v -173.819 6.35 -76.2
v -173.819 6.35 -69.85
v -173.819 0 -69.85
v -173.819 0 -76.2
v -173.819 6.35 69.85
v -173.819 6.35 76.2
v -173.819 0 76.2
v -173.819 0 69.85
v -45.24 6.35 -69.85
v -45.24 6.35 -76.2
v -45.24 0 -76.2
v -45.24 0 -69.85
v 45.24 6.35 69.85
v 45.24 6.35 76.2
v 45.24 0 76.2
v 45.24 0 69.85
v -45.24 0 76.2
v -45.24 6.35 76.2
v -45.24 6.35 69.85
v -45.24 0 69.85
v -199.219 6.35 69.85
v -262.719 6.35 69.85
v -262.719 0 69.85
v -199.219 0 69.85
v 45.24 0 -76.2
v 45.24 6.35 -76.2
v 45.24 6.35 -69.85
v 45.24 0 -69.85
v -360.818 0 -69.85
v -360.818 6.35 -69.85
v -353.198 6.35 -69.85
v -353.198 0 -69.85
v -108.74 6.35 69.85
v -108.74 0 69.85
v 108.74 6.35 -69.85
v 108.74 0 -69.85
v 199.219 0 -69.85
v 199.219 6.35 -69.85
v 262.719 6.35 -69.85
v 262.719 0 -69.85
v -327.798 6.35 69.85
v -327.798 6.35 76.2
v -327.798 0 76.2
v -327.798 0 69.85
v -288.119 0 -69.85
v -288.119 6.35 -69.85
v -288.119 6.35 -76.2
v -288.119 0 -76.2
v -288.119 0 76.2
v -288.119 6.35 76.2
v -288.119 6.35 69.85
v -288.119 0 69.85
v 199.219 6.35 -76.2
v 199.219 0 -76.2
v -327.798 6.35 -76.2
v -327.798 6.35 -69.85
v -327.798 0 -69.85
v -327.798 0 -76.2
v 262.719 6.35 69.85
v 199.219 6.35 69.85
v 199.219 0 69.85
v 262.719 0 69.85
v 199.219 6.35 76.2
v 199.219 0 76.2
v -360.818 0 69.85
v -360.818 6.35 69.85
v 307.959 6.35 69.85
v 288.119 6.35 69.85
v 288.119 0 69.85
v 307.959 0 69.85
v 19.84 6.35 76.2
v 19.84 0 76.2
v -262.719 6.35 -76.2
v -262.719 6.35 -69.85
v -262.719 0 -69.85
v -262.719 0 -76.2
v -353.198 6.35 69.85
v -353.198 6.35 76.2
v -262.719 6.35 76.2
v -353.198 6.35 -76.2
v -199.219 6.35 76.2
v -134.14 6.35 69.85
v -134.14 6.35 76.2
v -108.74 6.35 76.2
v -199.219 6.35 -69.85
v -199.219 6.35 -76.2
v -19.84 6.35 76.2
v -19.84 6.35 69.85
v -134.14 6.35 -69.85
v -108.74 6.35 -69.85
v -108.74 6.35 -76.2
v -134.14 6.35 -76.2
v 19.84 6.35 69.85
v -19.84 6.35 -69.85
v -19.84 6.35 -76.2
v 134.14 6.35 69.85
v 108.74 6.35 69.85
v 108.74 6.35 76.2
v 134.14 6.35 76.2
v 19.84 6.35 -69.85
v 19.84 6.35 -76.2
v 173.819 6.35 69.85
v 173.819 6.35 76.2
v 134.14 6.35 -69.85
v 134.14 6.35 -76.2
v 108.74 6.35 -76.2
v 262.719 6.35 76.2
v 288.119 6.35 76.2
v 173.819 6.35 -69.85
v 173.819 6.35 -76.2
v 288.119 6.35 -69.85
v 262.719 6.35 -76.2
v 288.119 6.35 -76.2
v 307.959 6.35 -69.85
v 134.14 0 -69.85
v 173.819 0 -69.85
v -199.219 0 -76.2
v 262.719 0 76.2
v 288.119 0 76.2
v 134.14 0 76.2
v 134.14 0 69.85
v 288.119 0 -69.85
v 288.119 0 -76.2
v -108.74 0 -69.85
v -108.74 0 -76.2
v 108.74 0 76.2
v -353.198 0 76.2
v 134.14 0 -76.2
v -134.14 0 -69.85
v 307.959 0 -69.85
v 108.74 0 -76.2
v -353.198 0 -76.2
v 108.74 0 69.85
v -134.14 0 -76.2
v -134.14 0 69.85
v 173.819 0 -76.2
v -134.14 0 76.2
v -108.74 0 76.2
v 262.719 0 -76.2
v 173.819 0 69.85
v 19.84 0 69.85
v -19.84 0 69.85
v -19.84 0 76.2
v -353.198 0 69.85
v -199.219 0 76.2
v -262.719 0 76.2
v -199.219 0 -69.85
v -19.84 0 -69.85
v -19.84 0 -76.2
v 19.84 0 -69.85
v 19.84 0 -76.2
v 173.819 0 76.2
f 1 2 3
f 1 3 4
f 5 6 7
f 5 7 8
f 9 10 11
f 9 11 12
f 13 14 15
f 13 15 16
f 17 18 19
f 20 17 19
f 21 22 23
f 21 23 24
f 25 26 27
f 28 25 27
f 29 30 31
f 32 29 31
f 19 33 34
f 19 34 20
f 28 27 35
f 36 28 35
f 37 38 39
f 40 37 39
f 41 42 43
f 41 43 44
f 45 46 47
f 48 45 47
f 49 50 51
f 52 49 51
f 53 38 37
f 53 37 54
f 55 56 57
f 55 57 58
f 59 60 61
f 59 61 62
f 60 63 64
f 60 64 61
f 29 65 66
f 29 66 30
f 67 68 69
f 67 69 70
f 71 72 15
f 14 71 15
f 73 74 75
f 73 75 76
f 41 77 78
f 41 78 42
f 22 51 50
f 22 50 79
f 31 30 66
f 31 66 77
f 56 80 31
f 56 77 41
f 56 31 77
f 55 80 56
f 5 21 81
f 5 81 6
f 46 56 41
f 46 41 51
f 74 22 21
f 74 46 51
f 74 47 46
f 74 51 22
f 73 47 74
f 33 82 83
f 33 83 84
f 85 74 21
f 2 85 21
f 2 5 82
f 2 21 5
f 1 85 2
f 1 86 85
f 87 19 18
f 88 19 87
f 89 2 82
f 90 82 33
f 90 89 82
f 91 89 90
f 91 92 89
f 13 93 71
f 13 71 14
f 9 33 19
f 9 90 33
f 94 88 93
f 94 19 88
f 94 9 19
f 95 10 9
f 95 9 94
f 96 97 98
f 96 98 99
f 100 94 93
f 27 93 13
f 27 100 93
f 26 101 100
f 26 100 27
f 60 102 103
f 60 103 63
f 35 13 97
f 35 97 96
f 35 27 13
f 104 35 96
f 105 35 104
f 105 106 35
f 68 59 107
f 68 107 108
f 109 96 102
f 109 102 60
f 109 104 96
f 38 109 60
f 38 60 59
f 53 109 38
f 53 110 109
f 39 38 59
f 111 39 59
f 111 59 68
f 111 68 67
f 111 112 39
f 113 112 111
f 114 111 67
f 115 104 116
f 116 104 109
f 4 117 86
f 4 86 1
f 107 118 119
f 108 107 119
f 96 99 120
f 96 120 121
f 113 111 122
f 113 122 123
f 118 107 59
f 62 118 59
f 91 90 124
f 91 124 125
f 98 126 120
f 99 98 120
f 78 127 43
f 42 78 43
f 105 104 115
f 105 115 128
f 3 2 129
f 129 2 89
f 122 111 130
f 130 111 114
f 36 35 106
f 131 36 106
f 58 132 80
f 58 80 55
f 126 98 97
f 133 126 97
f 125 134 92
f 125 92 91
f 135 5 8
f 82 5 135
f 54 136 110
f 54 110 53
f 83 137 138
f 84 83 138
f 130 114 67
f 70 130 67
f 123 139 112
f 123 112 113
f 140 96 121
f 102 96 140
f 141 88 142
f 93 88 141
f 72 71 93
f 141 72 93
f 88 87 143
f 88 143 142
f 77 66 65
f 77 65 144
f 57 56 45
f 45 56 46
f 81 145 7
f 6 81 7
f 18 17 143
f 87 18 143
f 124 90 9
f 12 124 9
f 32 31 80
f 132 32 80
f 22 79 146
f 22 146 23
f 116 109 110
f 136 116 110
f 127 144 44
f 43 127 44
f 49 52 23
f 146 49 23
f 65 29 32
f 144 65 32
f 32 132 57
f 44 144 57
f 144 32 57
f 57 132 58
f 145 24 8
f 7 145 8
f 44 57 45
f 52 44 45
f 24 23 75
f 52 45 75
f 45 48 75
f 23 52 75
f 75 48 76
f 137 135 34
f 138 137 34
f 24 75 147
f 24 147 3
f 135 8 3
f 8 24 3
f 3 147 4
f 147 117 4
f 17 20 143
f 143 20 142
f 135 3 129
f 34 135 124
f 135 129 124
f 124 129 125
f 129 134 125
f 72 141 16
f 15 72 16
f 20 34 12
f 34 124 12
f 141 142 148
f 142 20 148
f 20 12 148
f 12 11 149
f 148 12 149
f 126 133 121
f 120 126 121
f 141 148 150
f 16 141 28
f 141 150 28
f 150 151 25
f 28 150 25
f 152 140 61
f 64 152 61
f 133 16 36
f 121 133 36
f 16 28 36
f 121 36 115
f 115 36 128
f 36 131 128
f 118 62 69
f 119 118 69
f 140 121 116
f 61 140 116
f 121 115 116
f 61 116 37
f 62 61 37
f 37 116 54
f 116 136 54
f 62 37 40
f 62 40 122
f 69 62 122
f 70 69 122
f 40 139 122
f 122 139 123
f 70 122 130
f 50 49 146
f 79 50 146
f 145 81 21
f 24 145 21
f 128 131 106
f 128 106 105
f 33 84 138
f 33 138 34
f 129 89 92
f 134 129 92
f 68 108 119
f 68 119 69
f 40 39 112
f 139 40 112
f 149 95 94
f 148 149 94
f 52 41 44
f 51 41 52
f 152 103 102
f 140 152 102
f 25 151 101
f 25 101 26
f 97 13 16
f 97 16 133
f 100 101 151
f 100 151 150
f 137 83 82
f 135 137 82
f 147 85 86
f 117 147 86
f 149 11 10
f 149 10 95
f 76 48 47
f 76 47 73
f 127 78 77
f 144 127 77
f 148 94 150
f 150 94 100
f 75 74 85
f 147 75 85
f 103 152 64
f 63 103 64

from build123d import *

# Parameters (mm, degrees)
SKETCH1_W                 = 721.63658441
SKETCH1_H                 = 152.4
BOSS_EXTRUDE1_DEPTH       = 6.35
SKETCH2_W                 = 39.679316882
SKETCH2_H                 = 6.35
SKETCH2_W_2               = 31.750000127
CUT_EXTRUDE1_DEPTH        = 7.35
LPATTERN1_COUNT           = 3
LPATTERN1_PITCH           = 153.979316882
LPATTERN1_COL_COUNT       = 3
LPATTERN1_COL_PITCH       = 153.979316882
MIRROR1_COPY_1_SKETCH_W   = 39.679316882
MIRROR1_COPY_1_SKETCH_H   = 6.35
MIRROR1_COPY_1_SKETCH_W_2 = 31.750000127
MIRROR1_COPY_1_DEPTH      = 7.35
MIRROR1_COPY_2_SKETCH_W   = 39.679316882
MIRROR1_COPY_2_SKETCH_H   = 6.35
MIRROR1_COPY_2_SKETCH_W_2 = 31.750000127
MIRROR1_COPY_2_DEPTH      = 7.35
MIRROR1_COPY_3_SKETCH_W   = 39.679316882
MIRROR1_COPY_3_SKETCH_H   = 6.35
MIRROR1_COPY_3_SKETCH_W_2 = 31.750000127
MIRROR1_COPY_3_DEPTH      = 7.35
MIRROR1_COPY_4_SKETCH_W   = 39.679316882
MIRROR1_COPY_4_SKETCH_H   = 6.35
MIRROR1_COPY_4_SKETCH_W_2 = 31.750000127
MIRROR1_COPY_4_DEPTH      = 7.35
CUT_EXTRUDE2_DEPTH        = 7.35


with BuildPart() as part:
    # Sketch1 → Boss-Extrude1 (new body)
    with BuildSketch(Plane(origin=(0, 0, 0), x_dir=(1, 0, 0), z_dir=(0, 1, 0))):
        Rectangle(SKETCH1_W, SKETCH1_H)
    extrude(amount=BOSS_EXTRUDE1_DEPTH)

    # Sketch2 → Cut-Extrude1 (cut, through all)
    with BuildSketch(Plane(origin=(0, 6.35, 0), x_dir=(1, 0, 0), z_dir=(0, 1, 0))):
        with Locations((0, -73.025)):
            Rectangle(SKETCH2_W, SKETCH2_H)
        with Locations((-61.114658505, -73.025)):
            Rectangle(SKETCH2_W_2, SKETCH2_H)
        with Locations((61.114658505, -73.025)):
            Rectangle(SKETCH2_W_2, SKETCH2_H)
    cut_extrude1 = extrude(amount=-CUT_EXTRUDE1_DEPTH, mode=Mode.SUBTRACT)

    # LPattern1: Cut-Extrude1 ×3
    with Locations(*[(i * LPATTERN1_PITCH, 0, 0) for i in range(1, LPATTERN1_COUNT)]):
        add(cut_extrude1, mode=Mode.SUBTRACT)

    # LPattern1 col: Cut-Extrude1 ×3
    with Locations(*[(-i * LPATTERN1_COL_PITCH, 0, 0) for i in range(1, LPATTERN1_COL_COUNT)]):
        add(cut_extrude1, mode=Mode.SUBTRACT)

    # Mirror1: Cut-Extrude1 across plane
    add(cut_extrude1.mirror(Plane.XY), mode=Mode.SUBTRACT)

    # Mirror1 copy 1 sketch → Mirror1 copy 1 (cut, through all)
    with BuildSketch(Plane(origin=(153.979316882, 6.35, 0), x_dir=(1, 0, 0), z_dir=(0, 1, 0))):
        with Locations((0, 73.025)):
            Rectangle(MIRROR1_COPY_1_SKETCH_W, MIRROR1_COPY_1_SKETCH_H)
        with Locations((-61.114658505, 73.025)):
            Rectangle(MIRROR1_COPY_1_SKETCH_W_2, MIRROR1_COPY_1_SKETCH_H)
        with Locations((61.114658505, 73.025)):
            Rectangle(MIRROR1_COPY_1_SKETCH_W_2, MIRROR1_COPY_1_SKETCH_H)
    extrude(amount=-MIRROR1_COPY_1_DEPTH, mode=Mode.SUBTRACT)

    # Mirror1 copy 2 sketch → Mirror1 copy 2 (cut, through all)
    with BuildSketch(Plane(origin=(307.958633764, 6.35, 0), x_dir=(1, 0, 0), z_dir=(0, 1, 0))):
        with Locations((0, 73.025)):
            Rectangle(MIRROR1_COPY_2_SKETCH_W, MIRROR1_COPY_2_SKETCH_H)
        with Locations((-61.114658505, 73.025)):
            Rectangle(MIRROR1_COPY_2_SKETCH_W_2, MIRROR1_COPY_2_SKETCH_H)
        with Locations((61.114658505, 73.025)):
            Rectangle(MIRROR1_COPY_2_SKETCH_W_2, MIRROR1_COPY_2_SKETCH_H)
    extrude(amount=-MIRROR1_COPY_2_DEPTH, mode=Mode.SUBTRACT)

    # Mirror1 copy 3 sketch → Mirror1 copy 3 (cut, through all)
    with BuildSketch(Plane(origin=(-153.979316882, 6.35, 0), x_dir=(1, 0, 0), z_dir=(0, 1, 0))):
        with Locations((0, 73.025)):
            Rectangle(MIRROR1_COPY_3_SKETCH_W, MIRROR1_COPY_3_SKETCH_H)
        with Locations((-61.114658505, 73.025)):
            Rectangle(MIRROR1_COPY_3_SKETCH_W_2, MIRROR1_COPY_3_SKETCH_H)
        with Locations((61.114658505, 73.025)):
            Rectangle(MIRROR1_COPY_3_SKETCH_W_2, MIRROR1_COPY_3_SKETCH_H)
    extrude(amount=-MIRROR1_COPY_3_DEPTH, mode=Mode.SUBTRACT)

    # Mirror1 copy 4 sketch → Mirror1 copy 4 (cut, through all)
    with BuildSketch(Plane(origin=(-307.958633764, 6.35, 0), x_dir=(1, 0, 0), z_dir=(0, 1, 0))):
        with Locations((0, 73.025)):
            Rectangle(MIRROR1_COPY_4_SKETCH_W, MIRROR1_COPY_4_SKETCH_H)
        with Locations((-61.114658505, 73.025)):
            Rectangle(MIRROR1_COPY_4_SKETCH_W_2, MIRROR1_COPY_4_SKETCH_H)
        with Locations((61.114658505, 73.025)):
            Rectangle(MIRROR1_COPY_4_SKETCH_W_2, MIRROR1_COPY_4_SKETCH_H)
    extrude(amount=-MIRROR1_COPY_4_DEPTH, mode=Mode.SUBTRACT)

    # Sketch3 → Cut-Extrude2 (cut, through all)
    with BuildSketch(Plane(origin=(0, 6.35, 0), x_dir=(1, 0, 0), z_dir=(0, 1, 0))):
        Polygon((307.958633764, 69.85), (307.958633764, -76.2), (360.818292205, -76.2), (360.818292205, 76.2), (307.958633764, 76.2), align=None)
    extrude(amount=-CUT_EXTRUDE2_DEPTH, mode=Mode.SUBTRACT)


solid = part.part
